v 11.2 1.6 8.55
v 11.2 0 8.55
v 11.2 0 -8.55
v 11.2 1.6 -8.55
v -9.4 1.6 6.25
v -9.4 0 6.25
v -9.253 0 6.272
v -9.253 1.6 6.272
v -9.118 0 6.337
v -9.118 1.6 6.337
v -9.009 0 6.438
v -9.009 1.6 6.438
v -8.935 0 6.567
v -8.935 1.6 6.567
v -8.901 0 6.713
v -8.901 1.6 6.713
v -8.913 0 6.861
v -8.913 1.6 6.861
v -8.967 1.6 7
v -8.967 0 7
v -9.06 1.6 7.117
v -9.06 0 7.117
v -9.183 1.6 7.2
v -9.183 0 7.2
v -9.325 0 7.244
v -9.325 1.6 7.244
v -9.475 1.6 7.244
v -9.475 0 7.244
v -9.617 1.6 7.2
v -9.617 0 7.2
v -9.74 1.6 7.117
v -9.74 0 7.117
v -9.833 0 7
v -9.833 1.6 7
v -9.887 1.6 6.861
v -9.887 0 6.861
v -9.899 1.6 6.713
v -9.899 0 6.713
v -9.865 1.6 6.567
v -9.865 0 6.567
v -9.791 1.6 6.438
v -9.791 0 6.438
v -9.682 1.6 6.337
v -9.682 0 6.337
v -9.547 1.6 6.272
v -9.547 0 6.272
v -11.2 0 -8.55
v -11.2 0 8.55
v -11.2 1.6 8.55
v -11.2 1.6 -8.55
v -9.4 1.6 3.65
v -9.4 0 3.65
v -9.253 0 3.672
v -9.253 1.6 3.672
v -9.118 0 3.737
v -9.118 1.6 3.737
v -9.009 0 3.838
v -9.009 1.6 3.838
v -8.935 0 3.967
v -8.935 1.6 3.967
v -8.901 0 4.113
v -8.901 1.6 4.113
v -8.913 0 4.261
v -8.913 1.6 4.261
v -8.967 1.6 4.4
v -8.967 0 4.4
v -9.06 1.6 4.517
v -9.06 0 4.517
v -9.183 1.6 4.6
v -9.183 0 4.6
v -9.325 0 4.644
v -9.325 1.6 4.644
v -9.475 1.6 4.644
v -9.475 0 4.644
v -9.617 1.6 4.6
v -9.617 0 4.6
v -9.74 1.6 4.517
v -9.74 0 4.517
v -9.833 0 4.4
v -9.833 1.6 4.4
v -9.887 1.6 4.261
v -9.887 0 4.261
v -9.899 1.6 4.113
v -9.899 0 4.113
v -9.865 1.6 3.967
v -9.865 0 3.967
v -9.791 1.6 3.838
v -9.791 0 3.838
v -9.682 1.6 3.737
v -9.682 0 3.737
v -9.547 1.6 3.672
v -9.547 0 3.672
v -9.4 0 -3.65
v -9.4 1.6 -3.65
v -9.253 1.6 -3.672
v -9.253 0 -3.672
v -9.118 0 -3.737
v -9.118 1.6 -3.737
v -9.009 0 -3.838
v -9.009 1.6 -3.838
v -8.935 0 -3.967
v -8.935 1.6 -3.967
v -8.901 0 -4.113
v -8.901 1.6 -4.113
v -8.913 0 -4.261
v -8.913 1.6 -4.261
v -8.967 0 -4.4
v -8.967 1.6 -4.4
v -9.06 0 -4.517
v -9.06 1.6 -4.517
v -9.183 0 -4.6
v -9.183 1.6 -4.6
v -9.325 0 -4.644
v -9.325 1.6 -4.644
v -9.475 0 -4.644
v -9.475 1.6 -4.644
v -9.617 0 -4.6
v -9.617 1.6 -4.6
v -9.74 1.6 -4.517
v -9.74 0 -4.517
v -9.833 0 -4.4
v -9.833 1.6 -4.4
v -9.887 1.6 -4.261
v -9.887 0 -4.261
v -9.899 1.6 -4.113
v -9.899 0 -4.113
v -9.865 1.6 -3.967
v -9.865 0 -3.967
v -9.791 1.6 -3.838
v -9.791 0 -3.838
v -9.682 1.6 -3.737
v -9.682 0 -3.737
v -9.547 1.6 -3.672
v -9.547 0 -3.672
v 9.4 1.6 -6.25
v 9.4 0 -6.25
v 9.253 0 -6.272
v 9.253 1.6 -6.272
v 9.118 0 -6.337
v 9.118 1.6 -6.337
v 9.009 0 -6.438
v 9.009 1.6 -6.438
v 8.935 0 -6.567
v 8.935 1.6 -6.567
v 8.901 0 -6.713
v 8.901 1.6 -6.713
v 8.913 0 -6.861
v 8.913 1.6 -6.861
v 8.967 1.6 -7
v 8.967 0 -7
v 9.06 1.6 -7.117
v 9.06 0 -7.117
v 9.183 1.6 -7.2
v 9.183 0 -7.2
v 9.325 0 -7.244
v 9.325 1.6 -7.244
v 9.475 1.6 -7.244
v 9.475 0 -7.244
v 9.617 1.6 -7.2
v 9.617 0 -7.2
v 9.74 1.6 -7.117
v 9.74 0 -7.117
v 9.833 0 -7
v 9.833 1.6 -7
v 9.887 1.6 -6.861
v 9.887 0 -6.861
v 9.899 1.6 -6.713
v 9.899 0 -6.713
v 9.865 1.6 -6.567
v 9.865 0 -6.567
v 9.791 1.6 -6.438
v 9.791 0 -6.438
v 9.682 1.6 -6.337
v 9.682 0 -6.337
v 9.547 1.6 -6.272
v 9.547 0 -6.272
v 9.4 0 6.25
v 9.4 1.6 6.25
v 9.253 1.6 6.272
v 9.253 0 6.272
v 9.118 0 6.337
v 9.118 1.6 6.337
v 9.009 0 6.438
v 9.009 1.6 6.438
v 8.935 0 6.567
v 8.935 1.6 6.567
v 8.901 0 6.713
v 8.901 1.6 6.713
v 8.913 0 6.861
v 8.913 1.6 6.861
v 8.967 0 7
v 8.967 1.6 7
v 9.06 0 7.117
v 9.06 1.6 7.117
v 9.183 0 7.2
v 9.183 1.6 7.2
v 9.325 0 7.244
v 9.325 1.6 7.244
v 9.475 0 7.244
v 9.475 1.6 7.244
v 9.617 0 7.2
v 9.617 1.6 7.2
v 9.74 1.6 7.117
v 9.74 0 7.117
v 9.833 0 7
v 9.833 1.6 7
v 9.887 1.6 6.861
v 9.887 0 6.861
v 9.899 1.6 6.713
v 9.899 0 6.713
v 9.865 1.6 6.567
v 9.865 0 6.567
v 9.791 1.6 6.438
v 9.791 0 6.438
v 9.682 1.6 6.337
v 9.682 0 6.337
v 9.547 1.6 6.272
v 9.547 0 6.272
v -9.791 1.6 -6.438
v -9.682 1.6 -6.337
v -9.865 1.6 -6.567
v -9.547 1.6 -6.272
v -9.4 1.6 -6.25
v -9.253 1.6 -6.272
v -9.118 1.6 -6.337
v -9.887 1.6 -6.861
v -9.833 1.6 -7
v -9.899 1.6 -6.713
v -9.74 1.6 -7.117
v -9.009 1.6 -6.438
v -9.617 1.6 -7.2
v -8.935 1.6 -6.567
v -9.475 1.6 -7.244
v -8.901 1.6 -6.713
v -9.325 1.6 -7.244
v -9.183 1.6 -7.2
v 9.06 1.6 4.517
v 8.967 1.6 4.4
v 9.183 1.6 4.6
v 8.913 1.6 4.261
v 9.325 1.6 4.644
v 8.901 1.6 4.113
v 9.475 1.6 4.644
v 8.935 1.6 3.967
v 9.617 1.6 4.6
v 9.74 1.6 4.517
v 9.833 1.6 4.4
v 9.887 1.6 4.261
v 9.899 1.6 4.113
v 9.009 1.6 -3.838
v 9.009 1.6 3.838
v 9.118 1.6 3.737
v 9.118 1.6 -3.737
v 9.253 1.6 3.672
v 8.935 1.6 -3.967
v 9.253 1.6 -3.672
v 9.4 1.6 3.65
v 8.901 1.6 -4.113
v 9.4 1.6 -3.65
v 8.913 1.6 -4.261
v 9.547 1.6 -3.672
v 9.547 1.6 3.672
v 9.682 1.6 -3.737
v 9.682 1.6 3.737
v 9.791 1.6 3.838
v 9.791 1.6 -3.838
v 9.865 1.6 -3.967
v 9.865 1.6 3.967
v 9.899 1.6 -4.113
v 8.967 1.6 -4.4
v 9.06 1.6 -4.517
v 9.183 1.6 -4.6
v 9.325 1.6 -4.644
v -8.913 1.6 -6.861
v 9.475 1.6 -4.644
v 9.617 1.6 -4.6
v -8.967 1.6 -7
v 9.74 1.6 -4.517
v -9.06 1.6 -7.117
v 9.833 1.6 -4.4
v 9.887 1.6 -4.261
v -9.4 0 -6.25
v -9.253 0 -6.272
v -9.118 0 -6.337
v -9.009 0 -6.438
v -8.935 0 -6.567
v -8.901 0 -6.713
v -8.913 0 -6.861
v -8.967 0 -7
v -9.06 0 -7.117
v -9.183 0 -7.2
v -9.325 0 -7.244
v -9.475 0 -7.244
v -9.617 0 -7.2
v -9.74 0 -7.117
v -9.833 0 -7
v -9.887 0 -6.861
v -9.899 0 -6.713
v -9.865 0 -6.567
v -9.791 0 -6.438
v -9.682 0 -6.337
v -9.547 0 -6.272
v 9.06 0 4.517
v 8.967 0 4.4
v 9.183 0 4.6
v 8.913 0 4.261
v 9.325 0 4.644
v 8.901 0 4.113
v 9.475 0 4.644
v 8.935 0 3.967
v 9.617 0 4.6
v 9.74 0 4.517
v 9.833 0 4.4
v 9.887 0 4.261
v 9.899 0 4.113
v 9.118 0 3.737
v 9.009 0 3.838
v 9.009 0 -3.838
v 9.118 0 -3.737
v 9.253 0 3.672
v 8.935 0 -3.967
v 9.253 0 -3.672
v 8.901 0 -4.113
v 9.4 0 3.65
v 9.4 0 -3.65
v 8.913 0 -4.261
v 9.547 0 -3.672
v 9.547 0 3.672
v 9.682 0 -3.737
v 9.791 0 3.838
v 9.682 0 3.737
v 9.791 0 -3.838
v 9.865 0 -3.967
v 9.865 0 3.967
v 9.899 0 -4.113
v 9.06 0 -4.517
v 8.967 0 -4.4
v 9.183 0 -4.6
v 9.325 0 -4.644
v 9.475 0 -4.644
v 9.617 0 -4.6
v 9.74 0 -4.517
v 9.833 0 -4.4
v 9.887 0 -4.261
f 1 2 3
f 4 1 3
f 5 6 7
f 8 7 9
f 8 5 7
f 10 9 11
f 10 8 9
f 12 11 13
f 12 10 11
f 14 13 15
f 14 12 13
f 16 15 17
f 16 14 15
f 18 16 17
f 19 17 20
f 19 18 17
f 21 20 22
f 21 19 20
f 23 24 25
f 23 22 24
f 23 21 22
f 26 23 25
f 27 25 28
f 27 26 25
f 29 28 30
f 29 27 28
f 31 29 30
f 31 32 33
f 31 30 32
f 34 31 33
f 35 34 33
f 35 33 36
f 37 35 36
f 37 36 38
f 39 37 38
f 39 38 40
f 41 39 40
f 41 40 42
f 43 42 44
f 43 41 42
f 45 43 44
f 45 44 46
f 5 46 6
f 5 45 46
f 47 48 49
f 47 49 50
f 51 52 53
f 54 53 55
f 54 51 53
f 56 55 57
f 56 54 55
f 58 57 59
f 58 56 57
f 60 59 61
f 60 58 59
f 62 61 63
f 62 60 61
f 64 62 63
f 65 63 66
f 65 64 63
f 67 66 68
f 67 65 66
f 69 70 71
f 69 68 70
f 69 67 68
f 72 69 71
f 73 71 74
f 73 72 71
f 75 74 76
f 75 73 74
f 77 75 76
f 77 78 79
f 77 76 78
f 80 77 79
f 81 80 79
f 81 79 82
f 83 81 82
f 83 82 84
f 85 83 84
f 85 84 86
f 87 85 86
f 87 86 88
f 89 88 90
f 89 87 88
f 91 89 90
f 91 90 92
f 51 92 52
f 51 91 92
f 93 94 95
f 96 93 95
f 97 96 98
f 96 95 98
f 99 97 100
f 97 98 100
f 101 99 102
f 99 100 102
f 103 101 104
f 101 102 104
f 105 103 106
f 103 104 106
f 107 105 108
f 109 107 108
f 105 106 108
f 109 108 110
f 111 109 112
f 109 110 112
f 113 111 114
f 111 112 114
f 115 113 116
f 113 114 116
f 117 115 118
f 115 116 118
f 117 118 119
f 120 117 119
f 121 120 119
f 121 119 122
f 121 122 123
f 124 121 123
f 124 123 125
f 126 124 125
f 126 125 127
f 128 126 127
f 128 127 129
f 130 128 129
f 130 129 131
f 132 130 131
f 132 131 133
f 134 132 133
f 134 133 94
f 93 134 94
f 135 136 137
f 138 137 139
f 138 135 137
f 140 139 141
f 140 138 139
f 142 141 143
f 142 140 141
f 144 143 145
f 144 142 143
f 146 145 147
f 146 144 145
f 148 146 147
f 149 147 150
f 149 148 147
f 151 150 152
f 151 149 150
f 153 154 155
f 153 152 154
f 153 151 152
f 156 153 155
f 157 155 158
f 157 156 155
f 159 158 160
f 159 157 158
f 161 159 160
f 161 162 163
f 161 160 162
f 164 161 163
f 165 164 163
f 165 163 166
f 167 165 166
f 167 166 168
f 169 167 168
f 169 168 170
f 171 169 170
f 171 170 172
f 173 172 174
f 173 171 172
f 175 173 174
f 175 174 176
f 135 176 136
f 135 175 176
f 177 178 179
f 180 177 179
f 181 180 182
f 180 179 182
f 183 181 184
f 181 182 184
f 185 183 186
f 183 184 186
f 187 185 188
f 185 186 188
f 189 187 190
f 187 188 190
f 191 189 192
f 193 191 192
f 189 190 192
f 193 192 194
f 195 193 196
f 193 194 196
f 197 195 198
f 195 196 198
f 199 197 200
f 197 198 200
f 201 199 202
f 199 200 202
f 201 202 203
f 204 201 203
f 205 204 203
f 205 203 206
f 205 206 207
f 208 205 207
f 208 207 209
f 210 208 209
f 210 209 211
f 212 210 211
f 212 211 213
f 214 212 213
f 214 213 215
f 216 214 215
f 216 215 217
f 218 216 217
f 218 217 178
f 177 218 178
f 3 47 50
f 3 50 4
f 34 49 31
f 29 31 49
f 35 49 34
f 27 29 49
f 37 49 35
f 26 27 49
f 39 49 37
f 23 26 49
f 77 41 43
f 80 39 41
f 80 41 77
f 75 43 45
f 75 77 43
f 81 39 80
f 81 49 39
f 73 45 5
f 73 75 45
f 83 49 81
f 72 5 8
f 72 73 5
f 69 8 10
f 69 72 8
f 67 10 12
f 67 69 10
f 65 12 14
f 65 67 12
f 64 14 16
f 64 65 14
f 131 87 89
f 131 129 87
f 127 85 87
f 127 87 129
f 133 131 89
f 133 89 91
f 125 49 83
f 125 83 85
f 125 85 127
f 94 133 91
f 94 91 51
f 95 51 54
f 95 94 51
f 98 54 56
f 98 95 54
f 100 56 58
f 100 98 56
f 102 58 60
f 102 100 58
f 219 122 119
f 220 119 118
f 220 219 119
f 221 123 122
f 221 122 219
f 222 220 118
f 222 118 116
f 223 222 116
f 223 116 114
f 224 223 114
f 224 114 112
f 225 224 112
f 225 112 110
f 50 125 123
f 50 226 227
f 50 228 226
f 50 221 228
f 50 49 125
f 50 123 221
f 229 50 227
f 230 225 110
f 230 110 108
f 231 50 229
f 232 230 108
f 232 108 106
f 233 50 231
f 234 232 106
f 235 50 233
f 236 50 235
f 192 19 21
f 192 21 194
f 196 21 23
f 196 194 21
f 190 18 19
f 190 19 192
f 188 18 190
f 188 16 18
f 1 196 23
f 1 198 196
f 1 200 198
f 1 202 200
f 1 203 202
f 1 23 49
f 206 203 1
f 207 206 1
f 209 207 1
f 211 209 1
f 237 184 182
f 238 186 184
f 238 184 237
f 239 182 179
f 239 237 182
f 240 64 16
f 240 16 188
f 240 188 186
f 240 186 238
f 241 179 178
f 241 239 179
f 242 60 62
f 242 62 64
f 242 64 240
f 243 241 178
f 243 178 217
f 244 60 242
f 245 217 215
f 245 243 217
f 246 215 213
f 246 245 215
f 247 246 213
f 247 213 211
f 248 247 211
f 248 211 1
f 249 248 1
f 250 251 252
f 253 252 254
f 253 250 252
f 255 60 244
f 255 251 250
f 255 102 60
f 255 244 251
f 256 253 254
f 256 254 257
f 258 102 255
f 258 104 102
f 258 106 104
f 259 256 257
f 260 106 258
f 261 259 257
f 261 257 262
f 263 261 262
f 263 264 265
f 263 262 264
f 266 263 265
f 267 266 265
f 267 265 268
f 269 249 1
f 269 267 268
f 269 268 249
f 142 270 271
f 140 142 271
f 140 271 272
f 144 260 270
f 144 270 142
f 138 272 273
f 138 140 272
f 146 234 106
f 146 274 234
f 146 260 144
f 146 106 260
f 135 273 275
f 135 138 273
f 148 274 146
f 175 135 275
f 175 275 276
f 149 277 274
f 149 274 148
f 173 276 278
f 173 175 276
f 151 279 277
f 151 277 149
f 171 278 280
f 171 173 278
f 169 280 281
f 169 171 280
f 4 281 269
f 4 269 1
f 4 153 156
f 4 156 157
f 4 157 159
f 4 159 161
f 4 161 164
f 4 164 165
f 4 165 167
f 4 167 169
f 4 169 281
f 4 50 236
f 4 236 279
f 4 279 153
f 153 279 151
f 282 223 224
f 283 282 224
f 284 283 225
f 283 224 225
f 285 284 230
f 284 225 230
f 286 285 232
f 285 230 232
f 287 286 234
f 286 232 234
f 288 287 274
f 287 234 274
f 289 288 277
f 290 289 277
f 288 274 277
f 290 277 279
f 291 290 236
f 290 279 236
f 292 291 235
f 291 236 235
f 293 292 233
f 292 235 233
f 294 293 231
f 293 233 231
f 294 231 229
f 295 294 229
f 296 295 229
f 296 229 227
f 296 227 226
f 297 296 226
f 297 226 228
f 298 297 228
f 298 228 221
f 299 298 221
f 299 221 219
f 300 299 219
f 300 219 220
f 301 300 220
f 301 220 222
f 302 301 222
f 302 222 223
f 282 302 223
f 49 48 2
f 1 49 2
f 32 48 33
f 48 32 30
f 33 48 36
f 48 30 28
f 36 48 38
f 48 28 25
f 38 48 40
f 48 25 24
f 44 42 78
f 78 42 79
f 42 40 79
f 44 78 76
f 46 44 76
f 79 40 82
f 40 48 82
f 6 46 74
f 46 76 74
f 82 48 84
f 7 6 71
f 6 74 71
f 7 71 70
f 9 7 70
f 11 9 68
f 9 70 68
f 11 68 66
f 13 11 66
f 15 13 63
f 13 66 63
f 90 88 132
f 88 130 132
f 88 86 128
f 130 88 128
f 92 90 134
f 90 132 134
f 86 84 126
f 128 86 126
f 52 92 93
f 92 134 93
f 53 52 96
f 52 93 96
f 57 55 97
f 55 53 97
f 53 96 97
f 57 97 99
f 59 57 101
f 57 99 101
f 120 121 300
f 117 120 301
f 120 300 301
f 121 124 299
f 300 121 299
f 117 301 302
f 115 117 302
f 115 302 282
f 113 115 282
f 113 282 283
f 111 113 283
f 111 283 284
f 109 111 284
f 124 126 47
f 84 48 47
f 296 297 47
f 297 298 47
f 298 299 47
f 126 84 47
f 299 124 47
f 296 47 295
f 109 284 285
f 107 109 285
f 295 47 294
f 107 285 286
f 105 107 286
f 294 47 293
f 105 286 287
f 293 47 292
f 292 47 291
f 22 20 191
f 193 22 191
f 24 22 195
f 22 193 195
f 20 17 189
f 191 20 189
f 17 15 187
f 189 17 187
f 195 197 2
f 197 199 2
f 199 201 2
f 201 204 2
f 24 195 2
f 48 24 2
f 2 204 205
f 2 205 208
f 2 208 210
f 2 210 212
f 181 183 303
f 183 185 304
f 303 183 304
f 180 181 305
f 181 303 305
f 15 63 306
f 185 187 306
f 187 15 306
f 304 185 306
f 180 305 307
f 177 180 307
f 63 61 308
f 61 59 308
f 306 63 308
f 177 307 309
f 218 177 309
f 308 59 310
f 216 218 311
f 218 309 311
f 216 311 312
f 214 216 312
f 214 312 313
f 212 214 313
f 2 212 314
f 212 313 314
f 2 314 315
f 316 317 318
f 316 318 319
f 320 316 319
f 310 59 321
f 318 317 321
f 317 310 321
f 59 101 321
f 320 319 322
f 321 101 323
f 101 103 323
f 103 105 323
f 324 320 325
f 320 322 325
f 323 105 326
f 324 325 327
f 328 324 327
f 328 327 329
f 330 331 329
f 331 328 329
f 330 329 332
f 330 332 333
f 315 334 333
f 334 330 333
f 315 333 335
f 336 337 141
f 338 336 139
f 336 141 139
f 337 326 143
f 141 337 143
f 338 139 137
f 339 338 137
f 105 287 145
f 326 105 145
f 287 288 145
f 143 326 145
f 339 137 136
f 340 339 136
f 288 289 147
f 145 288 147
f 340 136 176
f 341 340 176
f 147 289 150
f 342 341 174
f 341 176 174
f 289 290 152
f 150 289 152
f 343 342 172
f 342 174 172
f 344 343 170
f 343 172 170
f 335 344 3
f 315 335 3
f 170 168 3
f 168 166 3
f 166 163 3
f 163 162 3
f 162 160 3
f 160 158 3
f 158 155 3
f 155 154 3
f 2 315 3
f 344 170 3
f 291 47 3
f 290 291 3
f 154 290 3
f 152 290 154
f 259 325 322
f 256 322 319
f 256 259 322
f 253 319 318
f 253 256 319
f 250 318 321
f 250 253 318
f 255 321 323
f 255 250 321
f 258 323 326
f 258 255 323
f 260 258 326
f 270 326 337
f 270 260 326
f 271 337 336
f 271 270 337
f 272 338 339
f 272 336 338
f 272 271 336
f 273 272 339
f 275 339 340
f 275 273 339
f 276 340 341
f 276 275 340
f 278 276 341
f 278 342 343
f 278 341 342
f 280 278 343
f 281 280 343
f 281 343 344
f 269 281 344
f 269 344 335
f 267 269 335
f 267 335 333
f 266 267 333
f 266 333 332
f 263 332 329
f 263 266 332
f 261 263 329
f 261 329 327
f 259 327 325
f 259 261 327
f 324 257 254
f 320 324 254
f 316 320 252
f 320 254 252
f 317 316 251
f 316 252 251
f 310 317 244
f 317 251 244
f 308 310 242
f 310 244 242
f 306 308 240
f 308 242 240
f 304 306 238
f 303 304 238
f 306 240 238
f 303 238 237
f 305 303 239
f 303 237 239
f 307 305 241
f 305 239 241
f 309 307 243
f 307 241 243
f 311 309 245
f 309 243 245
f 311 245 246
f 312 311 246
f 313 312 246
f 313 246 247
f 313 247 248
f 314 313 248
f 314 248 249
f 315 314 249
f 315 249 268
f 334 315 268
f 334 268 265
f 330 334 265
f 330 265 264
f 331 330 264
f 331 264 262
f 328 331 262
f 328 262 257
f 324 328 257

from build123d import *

# Parameters (mm, degrees)
SKETCH1_W                       = 22.4
SKETCH1_H                       = 17.1
MAIN_BODY_DEPTH                 = 1.6
SKETCH2_R                       = 0.5
SOLDERED_CONNECTION_HOLES_DEPTH = 15.181061314
MIRROR2_COPY_1_SKETCH_R         = 0.5
MIRROR2_COPY_1_DEPTH            = 15.181061314


with BuildPart() as part:
    # Sketch1 → MAIN BODY (new body)
    with BuildSketch(Plane(origin=(0, 0, 0), x_dir=(1, 0, 0), z_dir=(0, 1, 0))):
        Rectangle(SKETCH1_W, SKETCH1_H)
    extrude(amount=MAIN_BODY_DEPTH)

    # Sketch2 → SOLDERED CONNECTION HOLES (cut, through all)
    with BuildSketch(Plane(origin=(0, 1.6, 0), x_dir=(1, 0, 0), z_dir=(0, 1, 0))):
        with Locations(Location((-9.4, 6.75, 0), (0, 0, 270))):
            Circle(SKETCH2_R)
        with Locations(Location((-9.4, 4.15, 0), (0, 0, 270))):
            Circle(SKETCH2_R)
    soldered_connection_holes = extrude(amount=-SOLDERED_CONNECTION_HOLES_DEPTH, mode=Mode.SUBTRACT)

    # Mirror1: SOLDERED CONNECTION HOLES across plane
    add(soldered_connection_holes.mirror(Plane(origin=(0, 0, 0), x_dir=(0, 0, 1), z_dir=(1, 0, 0))), mode=Mode.SUBTRACT)

    # Mirror2: SOLDERED CONNECTION HOLES across plane
    add(soldered_connection_holes.mirror(Plane.XY), mode=Mode.SUBTRACT)

    # Mirror2 copy 1 sketch → Mirror2 copy 1 (cut, through all)
    with BuildSketch(Plane(origin=(0, 1.6, 0), x_dir=(-1, 0, 0), z_dir=(0, 1, 0))):
        with Locations(Location((-9.4, 6.75, 0), (0, 0, 270))):
            Circle(MIRROR2_COPY_1_SKETCH_R)
        with Locations(Location((-9.4, 4.15, 0), (0, 0, 270))):
            Circle(MIRROR2_COPY_1_SKETCH_R)
    extrude(amount=-MIRROR2_COPY_1_DEPTH, mode=Mode.SUBTRACT)


solid = part.part
